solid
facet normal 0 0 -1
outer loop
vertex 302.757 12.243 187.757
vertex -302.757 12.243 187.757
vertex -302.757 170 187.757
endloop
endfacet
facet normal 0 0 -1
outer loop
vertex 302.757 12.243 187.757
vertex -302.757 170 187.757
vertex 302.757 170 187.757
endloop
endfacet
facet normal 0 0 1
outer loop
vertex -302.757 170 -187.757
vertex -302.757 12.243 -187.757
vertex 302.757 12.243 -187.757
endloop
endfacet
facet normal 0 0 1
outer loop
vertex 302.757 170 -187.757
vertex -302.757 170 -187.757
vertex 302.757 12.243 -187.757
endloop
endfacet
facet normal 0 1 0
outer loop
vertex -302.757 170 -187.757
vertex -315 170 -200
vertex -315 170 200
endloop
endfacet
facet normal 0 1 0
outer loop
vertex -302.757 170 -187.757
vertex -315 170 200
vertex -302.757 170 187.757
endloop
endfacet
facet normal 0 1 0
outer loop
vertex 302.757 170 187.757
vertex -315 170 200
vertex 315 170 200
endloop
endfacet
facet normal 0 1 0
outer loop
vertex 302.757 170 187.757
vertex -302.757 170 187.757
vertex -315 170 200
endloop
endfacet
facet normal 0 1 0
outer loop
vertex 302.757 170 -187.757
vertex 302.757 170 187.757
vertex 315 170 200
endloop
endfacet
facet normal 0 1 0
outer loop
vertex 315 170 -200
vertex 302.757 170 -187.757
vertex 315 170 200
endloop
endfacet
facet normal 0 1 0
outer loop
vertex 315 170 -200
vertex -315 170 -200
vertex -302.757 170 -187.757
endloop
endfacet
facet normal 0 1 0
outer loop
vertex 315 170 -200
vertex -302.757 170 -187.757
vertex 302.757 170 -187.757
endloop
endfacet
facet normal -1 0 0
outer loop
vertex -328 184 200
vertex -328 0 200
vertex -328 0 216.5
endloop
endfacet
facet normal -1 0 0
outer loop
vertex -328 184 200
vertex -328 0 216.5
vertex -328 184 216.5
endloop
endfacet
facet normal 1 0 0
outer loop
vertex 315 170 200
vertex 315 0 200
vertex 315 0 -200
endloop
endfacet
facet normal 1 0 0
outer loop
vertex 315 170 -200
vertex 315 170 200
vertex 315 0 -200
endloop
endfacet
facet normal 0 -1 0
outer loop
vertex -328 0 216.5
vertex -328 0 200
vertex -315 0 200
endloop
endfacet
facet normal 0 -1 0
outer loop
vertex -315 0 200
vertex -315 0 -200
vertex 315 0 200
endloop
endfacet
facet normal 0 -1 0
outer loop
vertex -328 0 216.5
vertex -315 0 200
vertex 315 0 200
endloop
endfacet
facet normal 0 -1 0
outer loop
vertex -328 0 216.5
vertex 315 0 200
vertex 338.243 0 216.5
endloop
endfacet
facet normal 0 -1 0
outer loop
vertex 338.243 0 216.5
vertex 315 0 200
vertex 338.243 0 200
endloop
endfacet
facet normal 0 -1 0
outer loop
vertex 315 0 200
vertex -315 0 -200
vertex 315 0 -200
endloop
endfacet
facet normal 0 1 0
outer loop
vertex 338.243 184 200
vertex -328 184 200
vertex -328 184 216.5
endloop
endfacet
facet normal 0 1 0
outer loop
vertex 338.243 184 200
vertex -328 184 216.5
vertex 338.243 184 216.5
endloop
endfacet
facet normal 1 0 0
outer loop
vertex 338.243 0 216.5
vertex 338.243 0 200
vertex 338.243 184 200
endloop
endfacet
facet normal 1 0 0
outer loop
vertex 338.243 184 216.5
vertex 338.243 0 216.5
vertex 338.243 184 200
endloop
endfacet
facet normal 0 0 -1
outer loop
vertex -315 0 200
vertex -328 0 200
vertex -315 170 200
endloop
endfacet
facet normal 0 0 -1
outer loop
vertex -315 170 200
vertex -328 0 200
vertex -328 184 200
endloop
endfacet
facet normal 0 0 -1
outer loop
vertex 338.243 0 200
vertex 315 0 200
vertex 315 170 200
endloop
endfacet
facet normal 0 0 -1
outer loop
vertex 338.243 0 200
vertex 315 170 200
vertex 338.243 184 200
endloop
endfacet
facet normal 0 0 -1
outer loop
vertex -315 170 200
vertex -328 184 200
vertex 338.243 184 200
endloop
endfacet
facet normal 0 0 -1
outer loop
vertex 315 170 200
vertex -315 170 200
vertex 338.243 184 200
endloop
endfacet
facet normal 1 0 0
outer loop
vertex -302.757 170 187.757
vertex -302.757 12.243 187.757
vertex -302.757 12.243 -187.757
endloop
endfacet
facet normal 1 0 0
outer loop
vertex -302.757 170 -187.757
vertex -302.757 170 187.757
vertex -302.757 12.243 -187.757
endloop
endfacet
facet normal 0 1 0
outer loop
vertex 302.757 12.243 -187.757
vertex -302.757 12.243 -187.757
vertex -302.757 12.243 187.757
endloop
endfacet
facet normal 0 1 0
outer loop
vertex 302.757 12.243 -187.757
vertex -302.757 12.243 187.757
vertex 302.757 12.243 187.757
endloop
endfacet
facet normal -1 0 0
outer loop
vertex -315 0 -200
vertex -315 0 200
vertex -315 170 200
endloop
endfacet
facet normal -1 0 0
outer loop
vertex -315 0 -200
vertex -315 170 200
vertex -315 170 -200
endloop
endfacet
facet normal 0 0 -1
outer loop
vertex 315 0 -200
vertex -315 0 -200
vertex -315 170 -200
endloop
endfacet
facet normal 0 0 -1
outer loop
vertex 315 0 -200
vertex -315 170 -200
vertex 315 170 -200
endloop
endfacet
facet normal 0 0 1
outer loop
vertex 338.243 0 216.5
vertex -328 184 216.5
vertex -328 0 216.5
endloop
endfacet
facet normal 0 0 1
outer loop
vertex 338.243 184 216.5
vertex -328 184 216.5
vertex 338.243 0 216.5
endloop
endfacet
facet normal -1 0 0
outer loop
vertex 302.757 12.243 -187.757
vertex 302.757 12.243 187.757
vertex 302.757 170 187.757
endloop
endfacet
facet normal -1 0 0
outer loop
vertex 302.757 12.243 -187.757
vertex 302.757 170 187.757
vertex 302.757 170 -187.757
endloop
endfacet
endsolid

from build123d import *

# Parameters (mm, degrees)
SKETCH1_W           = 630
SKETCH1_H           = 400
EXTRUSION_DEPTH     = 170
DRAWER_S_INTERIOR_T = -12.2428
SKETCH3_W           = 666.2428
SKETCH3_H           = 184
BOSS_EXTRUDE3_DEPTH = 16.5


with BuildPart() as part:
    # Sketch1 → Extrusion (new body)
    with BuildSketch(Plane(origin=(0, 0, 0), x_dir=(1, 0, 0), z_dir=(0, 1, 0))):
        Rectangle(SKETCH1_W, SKETCH1_H)
    extrude(amount=EXTRUSION_DEPTH)

    # Drawer's interior
    drawer_s_interior_openings = [part.faces().sort_by_distance(p)[0] for p in [
        (0, 170, 0),
    ]]
    offset(amount=DRAWER_S_INTERIOR_T, openings=drawer_s_interior_openings, kind=Kind.INTERSECTION)

    # Sketch3 → Boss-Extrude3 (add)
    with BuildSketch(Plane.XY.offset(200)):
        with Locations((5.1214, 92)):
            Rectangle(SKETCH3_W, SKETCH3_H)
    extrude(amount=BOSS_EXTRUDE3_DEPTH)


solid = part.part
